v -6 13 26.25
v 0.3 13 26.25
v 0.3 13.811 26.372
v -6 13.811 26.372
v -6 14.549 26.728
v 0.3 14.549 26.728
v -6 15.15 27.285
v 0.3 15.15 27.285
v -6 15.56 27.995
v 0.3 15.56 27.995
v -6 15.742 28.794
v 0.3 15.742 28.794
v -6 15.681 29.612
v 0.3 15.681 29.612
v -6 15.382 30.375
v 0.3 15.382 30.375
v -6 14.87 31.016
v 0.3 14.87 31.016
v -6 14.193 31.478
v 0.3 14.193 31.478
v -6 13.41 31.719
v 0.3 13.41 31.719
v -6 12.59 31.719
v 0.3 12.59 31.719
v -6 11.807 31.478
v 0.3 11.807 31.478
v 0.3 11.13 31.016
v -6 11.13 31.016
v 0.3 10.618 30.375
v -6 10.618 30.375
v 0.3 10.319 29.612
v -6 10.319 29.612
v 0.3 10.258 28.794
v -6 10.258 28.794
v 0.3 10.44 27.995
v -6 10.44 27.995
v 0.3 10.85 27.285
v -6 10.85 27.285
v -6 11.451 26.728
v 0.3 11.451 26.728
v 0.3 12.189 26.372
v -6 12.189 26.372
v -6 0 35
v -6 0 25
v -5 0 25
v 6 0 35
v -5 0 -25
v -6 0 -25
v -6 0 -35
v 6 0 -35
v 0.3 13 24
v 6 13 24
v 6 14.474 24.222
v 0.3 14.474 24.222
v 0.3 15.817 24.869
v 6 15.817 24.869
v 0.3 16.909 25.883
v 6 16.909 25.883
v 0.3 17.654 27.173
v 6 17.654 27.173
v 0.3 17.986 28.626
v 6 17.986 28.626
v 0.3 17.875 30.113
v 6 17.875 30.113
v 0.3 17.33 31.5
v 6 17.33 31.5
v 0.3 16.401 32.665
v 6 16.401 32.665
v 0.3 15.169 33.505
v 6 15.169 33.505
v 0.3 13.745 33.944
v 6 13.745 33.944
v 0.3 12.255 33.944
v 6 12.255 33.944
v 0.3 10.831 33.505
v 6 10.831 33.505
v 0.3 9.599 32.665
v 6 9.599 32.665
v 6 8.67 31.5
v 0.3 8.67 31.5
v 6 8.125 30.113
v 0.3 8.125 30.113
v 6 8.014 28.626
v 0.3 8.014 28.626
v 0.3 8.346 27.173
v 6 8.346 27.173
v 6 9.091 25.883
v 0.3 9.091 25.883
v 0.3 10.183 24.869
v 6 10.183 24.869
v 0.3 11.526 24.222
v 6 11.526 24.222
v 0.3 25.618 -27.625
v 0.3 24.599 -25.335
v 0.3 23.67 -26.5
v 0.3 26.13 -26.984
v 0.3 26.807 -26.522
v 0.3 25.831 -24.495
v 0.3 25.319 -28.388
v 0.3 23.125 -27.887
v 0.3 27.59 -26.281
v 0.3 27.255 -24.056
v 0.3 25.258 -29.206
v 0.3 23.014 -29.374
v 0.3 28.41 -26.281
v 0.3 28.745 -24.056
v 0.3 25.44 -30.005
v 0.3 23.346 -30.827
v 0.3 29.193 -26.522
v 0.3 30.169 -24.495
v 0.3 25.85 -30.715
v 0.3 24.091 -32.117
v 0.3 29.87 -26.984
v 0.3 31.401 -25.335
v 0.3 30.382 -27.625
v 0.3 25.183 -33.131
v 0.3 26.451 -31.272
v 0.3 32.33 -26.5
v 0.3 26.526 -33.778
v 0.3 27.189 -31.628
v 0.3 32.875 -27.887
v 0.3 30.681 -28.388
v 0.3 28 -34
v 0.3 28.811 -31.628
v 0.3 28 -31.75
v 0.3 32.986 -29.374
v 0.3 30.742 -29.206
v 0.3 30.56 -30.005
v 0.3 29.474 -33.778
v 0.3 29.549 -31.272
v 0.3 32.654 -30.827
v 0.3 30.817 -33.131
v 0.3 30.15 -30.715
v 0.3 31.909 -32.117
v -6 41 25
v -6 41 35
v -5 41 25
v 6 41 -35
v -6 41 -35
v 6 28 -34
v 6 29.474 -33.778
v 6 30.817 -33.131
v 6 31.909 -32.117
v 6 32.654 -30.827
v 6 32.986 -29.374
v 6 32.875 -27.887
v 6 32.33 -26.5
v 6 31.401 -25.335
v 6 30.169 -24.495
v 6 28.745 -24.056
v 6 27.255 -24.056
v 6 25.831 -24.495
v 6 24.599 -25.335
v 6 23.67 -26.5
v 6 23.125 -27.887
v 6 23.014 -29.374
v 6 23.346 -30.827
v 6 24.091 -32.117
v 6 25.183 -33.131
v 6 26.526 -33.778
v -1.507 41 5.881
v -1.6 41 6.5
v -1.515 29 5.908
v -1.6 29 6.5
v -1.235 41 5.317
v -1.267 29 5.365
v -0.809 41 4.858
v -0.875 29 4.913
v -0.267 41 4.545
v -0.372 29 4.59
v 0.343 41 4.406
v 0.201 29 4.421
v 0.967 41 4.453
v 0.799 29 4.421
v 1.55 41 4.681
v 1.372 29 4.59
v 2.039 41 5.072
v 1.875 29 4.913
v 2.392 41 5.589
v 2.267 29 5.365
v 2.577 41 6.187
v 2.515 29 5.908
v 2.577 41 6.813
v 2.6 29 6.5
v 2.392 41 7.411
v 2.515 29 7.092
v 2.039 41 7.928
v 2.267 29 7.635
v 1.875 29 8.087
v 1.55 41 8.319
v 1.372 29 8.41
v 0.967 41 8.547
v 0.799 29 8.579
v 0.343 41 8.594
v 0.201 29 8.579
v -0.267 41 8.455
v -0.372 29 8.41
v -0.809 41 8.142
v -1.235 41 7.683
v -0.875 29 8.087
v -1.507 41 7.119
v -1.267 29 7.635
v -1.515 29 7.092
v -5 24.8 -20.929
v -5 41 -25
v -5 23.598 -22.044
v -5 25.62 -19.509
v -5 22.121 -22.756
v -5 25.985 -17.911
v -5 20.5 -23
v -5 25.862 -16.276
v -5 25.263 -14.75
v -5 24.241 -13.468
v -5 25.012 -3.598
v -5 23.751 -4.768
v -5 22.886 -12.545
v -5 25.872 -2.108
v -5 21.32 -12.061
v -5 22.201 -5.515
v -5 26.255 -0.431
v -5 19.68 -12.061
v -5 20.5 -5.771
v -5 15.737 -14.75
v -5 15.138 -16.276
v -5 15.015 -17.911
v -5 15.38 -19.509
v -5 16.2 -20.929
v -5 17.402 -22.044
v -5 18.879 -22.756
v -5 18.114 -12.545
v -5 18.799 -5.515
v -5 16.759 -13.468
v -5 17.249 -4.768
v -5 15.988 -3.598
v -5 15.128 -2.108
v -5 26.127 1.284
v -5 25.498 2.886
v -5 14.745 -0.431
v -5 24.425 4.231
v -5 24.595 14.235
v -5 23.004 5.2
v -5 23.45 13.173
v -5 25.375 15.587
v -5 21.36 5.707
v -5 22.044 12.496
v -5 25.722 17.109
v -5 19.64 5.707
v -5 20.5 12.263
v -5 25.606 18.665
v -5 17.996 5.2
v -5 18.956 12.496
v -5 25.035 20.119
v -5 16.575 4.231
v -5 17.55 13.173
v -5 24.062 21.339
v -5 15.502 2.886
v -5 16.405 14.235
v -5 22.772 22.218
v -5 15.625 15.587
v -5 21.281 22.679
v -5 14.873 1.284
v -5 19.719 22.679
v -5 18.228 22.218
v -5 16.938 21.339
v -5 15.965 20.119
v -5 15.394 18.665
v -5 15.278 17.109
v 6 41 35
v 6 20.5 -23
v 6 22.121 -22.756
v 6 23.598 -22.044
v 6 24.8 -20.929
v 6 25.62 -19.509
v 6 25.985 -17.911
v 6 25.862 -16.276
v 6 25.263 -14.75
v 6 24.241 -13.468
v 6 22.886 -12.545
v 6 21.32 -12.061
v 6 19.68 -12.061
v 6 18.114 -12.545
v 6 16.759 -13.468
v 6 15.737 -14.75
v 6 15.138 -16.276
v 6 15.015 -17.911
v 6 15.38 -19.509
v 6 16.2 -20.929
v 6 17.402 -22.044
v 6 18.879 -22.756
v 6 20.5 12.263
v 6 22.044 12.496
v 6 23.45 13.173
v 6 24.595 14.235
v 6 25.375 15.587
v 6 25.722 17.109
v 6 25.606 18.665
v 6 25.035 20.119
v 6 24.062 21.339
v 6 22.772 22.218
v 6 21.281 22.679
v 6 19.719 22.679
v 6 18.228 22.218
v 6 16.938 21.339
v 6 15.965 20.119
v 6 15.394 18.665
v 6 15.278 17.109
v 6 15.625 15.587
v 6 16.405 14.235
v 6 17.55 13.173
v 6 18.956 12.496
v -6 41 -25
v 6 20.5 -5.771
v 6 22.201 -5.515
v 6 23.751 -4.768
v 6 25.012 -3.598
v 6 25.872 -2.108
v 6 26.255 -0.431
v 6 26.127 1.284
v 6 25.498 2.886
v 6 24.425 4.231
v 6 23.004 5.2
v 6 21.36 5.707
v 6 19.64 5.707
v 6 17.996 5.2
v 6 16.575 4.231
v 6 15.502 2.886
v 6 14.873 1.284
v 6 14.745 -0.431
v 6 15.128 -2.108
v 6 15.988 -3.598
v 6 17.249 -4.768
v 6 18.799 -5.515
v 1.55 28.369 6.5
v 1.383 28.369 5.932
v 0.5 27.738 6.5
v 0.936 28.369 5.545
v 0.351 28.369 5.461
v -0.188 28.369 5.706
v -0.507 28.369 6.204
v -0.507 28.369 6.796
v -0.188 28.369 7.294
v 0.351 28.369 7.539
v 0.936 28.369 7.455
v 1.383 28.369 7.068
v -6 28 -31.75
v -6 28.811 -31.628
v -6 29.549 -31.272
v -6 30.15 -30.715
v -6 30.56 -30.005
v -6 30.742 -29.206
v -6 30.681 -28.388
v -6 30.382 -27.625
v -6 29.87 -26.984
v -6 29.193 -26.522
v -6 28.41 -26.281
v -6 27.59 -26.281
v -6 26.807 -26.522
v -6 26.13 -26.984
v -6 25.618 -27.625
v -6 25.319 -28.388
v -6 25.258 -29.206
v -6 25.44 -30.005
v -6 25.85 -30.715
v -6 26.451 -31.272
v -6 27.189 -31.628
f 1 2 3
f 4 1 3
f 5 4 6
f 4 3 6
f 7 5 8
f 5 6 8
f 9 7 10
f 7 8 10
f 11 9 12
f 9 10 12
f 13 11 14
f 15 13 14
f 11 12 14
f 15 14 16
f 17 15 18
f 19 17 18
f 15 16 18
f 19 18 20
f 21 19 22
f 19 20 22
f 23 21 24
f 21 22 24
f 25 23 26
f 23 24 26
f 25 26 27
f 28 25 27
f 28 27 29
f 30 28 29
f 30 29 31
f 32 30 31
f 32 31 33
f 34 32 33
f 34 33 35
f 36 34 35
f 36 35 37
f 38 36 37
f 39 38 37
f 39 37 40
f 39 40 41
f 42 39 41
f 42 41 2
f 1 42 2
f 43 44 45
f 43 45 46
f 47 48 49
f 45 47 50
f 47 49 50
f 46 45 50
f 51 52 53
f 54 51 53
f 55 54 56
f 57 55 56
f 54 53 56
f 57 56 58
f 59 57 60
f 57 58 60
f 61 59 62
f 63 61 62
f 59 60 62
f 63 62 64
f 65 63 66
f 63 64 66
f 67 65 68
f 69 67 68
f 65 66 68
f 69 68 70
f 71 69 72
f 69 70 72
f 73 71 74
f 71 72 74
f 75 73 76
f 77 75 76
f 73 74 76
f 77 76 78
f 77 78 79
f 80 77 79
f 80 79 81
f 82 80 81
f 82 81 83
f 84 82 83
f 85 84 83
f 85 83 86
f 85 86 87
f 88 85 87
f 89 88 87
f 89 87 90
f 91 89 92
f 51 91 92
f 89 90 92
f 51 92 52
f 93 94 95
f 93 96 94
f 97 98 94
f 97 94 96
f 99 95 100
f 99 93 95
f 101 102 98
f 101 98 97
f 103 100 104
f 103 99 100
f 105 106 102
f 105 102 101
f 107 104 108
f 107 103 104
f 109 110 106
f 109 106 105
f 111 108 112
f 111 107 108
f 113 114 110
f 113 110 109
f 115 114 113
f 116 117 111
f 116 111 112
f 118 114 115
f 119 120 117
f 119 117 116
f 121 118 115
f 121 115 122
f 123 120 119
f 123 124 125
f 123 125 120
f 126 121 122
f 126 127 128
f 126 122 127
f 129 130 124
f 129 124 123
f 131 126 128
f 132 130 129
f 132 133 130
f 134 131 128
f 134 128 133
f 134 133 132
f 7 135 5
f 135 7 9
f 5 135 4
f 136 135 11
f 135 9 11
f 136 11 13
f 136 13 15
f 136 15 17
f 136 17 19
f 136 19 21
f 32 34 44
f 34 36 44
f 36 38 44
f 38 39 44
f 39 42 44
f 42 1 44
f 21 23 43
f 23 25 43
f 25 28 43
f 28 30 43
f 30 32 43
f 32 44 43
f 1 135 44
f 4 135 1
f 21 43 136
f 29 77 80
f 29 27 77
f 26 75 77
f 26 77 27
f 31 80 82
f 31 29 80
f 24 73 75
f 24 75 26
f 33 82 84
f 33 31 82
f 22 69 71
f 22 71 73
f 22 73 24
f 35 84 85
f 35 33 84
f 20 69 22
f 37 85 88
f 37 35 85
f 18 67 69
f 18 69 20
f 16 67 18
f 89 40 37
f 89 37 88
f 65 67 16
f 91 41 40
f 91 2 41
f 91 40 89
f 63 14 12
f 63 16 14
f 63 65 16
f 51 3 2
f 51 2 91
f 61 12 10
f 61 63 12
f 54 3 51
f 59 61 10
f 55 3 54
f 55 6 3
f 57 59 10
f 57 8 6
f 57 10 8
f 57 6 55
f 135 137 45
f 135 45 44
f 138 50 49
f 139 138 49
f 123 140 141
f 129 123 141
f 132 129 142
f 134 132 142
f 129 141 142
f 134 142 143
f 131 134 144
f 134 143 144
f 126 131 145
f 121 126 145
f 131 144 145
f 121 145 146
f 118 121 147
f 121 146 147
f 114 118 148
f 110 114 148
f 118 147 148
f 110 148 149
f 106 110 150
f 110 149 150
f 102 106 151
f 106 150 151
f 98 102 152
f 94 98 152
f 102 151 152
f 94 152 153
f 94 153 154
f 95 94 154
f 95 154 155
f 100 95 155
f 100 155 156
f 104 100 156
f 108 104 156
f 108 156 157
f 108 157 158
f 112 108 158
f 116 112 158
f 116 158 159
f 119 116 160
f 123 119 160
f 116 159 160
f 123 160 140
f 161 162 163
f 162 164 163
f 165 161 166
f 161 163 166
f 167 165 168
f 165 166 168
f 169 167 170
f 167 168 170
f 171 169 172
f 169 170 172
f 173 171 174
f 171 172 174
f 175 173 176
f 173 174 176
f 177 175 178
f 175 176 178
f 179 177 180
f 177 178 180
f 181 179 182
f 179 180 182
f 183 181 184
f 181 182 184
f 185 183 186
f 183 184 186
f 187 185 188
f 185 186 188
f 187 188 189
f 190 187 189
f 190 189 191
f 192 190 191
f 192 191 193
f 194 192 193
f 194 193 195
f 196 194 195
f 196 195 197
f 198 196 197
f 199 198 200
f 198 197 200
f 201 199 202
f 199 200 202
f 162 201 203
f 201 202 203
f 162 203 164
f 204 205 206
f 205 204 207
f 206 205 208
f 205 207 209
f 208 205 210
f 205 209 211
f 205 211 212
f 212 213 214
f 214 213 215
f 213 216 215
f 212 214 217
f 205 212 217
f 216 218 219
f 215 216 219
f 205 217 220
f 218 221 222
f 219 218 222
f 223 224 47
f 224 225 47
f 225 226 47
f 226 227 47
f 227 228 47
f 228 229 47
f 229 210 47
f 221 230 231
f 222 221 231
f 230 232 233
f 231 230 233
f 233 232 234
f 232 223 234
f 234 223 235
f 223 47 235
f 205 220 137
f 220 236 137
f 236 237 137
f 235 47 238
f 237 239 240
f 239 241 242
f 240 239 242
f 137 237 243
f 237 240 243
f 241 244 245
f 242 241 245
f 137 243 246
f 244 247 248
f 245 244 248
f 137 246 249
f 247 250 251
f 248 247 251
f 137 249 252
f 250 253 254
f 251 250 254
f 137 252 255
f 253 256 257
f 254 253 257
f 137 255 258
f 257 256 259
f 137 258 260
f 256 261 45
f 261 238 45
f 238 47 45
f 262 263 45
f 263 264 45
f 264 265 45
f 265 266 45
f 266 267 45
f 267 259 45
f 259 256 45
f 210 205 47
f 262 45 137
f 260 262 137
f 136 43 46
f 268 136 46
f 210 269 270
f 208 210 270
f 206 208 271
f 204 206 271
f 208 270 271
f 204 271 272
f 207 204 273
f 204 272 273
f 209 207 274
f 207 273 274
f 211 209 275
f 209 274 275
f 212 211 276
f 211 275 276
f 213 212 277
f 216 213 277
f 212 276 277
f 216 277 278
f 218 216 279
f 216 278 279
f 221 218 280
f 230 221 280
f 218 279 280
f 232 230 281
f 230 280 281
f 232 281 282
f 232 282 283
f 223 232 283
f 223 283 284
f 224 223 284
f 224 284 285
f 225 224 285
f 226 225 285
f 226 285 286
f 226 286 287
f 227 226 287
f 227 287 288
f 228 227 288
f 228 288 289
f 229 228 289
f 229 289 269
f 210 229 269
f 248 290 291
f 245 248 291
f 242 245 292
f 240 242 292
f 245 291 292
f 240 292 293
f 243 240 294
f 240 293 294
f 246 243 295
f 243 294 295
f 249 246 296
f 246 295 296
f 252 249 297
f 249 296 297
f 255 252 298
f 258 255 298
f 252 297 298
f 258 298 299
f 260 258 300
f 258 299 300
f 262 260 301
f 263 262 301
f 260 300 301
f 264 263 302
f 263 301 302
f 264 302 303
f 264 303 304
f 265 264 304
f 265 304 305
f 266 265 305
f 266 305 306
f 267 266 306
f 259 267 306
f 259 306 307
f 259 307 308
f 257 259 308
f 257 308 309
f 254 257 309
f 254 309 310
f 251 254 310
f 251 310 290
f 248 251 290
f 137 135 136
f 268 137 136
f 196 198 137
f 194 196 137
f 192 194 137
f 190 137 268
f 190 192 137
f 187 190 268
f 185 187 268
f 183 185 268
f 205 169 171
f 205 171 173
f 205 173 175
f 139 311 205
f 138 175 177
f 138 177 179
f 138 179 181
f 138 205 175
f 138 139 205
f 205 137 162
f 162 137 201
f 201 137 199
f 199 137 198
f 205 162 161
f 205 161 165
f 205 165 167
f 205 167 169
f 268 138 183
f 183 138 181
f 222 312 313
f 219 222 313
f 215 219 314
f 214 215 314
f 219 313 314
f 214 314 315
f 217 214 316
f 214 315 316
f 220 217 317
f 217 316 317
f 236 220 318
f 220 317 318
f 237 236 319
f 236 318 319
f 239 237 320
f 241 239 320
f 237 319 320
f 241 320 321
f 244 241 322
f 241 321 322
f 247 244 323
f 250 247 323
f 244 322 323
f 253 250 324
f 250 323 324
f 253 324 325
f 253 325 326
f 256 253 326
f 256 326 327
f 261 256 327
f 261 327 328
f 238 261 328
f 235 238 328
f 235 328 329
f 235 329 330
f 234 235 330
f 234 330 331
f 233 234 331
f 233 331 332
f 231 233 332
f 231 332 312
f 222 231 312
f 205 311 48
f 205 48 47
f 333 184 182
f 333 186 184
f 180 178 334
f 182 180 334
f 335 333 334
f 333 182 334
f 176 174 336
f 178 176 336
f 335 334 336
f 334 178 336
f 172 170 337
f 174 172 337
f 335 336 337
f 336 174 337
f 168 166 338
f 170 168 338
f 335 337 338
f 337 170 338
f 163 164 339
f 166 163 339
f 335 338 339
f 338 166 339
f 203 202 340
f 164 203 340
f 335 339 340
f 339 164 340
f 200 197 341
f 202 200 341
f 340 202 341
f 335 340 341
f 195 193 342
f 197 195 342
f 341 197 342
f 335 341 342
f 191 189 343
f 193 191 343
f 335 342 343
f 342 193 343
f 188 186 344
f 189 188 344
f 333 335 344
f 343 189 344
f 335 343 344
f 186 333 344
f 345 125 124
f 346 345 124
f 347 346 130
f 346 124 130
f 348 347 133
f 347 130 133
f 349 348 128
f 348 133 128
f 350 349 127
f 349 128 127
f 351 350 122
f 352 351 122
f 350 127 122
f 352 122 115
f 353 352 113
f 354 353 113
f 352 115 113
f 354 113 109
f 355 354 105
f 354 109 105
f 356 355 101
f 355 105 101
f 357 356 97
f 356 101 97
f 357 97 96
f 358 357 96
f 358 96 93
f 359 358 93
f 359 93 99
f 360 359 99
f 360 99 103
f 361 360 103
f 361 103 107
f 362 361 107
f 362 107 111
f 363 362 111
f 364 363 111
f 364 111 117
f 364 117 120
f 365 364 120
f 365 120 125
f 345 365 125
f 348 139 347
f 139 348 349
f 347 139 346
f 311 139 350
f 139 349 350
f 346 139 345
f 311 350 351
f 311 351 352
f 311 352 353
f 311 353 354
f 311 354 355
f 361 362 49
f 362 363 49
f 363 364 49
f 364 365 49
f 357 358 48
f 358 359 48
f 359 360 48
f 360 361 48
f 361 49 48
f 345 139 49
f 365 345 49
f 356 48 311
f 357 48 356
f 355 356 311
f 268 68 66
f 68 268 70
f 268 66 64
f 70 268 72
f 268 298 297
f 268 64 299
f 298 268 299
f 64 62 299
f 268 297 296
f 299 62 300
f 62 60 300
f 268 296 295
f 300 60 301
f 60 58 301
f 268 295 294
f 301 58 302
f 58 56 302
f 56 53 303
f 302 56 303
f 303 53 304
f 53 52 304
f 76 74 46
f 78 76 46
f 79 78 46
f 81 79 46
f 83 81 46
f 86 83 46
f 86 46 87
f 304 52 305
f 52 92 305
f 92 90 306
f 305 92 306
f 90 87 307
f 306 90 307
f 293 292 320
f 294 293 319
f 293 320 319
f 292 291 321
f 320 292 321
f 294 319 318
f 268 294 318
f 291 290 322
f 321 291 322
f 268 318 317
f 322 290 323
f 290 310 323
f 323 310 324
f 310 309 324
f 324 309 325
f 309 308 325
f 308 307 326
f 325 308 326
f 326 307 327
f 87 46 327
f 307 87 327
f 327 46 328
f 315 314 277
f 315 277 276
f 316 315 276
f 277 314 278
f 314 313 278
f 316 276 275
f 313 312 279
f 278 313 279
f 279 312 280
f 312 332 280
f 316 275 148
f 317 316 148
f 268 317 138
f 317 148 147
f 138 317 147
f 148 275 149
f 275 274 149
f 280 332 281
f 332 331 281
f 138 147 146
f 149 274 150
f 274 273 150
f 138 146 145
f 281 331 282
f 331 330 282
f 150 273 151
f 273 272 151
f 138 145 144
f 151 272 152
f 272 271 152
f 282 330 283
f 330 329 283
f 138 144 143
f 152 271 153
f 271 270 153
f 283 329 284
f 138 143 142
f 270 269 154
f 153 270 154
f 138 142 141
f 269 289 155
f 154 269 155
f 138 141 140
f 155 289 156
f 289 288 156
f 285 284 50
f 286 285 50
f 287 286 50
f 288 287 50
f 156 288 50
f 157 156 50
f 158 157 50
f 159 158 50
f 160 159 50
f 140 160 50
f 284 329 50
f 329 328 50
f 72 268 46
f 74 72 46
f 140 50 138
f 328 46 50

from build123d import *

# Parameters (mm, degrees)
BOSS_EXTRUDE1_DEPTH   = 41
SKETCH2_R             = 2.75
SKETCH2_R_2           = 5.237100589
SKETCH2_R_3           = 5.771252778
SKETCH2_R_4           = 5.5
CUT_EXTRUDE10_DEPTH   = 13
SKETCH11_R            = 5
CUT_EXTRUDE11_DEPTH   = 5.7
M5_TAPPED_HOLE1_D     = 4.2
M5_TAPPED_HOLE1_DEPTH = 12
M5_TAPPED_HOLE1_TIP   = 1.2618073


with BuildPart() as part:
    # Sketch1 → Boss-Extrude1 (new body)
    with BuildSketch(Plane(origin=(0, 0, 0), x_dir=(1, 0, 0), z_dir=(0, 1, 0))):
        Polygon((-6, 25), (-5, 25), (-5, -25), (-6, -25), (-6, -35), (6, -35), (6, 35), (-6, 35), align=None)
    extrude(amount=BOSS_EXTRUDE1_DEPTH)

    # Sketch2 → Cut-Extrude10 (cut, through all)
    with BuildSketch(Plane(origin=(6, 0, 0), x_dir=(0, 0, -1), z_dir=(1, 0, 0))):
        with Locations((29, 28)):
            Circle(SKETCH2_R)
        with Locations((-17.5, 20.5)):
            Circle(SKETCH2_R_2)
        with Locations((0, 20.5)):
            Circle(SKETCH2_R_3)
        with Locations((17.5, 20.5)):
            Circle(SKETCH2_R_4)
        with Locations((-29, 13)):
            Circle(SKETCH2_R)
    extrude(amount=-CUT_EXTRUDE10_DEPTH, mode=Mode.SUBTRACT)

    # Sketch11 → Cut-Extrude11 (cut)
    with BuildSketch(Plane(origin=(6, 0, 0), x_dir=(0, 0, -1), z_dir=(1, 0, 0))):
        with Locations((29, 28)):
            Circle(SKETCH11_R)
        with Locations((-29, 13)):
            Circle(SKETCH11_R)
    extrude(amount=-CUT_EXTRUDE11_DEPTH, mode=Mode.SUBTRACT)

    # M5 Tapped Hole1
    with Locations(Plane(origin=(0, 41, 0), x_dir=(1, 0, 0), z_dir=(0, 1, 0))):
        with Locations((0.5, -6.5)):
            Hole(M5_TAPPED_HOLE1_D / 2, depth=M5_TAPPED_HOLE1_DEPTH)
            with Locations((0, 0, -(M5_TAPPED_HOLE1_DEPTH + M5_TAPPED_HOLE1_TIP / 2))):  # 118° drill point
                Cone(0, M5_TAPPED_HOLE1_D / 2, M5_TAPPED_HOLE1_TIP, mode=Mode.SUBTRACT)


solid = part.part
